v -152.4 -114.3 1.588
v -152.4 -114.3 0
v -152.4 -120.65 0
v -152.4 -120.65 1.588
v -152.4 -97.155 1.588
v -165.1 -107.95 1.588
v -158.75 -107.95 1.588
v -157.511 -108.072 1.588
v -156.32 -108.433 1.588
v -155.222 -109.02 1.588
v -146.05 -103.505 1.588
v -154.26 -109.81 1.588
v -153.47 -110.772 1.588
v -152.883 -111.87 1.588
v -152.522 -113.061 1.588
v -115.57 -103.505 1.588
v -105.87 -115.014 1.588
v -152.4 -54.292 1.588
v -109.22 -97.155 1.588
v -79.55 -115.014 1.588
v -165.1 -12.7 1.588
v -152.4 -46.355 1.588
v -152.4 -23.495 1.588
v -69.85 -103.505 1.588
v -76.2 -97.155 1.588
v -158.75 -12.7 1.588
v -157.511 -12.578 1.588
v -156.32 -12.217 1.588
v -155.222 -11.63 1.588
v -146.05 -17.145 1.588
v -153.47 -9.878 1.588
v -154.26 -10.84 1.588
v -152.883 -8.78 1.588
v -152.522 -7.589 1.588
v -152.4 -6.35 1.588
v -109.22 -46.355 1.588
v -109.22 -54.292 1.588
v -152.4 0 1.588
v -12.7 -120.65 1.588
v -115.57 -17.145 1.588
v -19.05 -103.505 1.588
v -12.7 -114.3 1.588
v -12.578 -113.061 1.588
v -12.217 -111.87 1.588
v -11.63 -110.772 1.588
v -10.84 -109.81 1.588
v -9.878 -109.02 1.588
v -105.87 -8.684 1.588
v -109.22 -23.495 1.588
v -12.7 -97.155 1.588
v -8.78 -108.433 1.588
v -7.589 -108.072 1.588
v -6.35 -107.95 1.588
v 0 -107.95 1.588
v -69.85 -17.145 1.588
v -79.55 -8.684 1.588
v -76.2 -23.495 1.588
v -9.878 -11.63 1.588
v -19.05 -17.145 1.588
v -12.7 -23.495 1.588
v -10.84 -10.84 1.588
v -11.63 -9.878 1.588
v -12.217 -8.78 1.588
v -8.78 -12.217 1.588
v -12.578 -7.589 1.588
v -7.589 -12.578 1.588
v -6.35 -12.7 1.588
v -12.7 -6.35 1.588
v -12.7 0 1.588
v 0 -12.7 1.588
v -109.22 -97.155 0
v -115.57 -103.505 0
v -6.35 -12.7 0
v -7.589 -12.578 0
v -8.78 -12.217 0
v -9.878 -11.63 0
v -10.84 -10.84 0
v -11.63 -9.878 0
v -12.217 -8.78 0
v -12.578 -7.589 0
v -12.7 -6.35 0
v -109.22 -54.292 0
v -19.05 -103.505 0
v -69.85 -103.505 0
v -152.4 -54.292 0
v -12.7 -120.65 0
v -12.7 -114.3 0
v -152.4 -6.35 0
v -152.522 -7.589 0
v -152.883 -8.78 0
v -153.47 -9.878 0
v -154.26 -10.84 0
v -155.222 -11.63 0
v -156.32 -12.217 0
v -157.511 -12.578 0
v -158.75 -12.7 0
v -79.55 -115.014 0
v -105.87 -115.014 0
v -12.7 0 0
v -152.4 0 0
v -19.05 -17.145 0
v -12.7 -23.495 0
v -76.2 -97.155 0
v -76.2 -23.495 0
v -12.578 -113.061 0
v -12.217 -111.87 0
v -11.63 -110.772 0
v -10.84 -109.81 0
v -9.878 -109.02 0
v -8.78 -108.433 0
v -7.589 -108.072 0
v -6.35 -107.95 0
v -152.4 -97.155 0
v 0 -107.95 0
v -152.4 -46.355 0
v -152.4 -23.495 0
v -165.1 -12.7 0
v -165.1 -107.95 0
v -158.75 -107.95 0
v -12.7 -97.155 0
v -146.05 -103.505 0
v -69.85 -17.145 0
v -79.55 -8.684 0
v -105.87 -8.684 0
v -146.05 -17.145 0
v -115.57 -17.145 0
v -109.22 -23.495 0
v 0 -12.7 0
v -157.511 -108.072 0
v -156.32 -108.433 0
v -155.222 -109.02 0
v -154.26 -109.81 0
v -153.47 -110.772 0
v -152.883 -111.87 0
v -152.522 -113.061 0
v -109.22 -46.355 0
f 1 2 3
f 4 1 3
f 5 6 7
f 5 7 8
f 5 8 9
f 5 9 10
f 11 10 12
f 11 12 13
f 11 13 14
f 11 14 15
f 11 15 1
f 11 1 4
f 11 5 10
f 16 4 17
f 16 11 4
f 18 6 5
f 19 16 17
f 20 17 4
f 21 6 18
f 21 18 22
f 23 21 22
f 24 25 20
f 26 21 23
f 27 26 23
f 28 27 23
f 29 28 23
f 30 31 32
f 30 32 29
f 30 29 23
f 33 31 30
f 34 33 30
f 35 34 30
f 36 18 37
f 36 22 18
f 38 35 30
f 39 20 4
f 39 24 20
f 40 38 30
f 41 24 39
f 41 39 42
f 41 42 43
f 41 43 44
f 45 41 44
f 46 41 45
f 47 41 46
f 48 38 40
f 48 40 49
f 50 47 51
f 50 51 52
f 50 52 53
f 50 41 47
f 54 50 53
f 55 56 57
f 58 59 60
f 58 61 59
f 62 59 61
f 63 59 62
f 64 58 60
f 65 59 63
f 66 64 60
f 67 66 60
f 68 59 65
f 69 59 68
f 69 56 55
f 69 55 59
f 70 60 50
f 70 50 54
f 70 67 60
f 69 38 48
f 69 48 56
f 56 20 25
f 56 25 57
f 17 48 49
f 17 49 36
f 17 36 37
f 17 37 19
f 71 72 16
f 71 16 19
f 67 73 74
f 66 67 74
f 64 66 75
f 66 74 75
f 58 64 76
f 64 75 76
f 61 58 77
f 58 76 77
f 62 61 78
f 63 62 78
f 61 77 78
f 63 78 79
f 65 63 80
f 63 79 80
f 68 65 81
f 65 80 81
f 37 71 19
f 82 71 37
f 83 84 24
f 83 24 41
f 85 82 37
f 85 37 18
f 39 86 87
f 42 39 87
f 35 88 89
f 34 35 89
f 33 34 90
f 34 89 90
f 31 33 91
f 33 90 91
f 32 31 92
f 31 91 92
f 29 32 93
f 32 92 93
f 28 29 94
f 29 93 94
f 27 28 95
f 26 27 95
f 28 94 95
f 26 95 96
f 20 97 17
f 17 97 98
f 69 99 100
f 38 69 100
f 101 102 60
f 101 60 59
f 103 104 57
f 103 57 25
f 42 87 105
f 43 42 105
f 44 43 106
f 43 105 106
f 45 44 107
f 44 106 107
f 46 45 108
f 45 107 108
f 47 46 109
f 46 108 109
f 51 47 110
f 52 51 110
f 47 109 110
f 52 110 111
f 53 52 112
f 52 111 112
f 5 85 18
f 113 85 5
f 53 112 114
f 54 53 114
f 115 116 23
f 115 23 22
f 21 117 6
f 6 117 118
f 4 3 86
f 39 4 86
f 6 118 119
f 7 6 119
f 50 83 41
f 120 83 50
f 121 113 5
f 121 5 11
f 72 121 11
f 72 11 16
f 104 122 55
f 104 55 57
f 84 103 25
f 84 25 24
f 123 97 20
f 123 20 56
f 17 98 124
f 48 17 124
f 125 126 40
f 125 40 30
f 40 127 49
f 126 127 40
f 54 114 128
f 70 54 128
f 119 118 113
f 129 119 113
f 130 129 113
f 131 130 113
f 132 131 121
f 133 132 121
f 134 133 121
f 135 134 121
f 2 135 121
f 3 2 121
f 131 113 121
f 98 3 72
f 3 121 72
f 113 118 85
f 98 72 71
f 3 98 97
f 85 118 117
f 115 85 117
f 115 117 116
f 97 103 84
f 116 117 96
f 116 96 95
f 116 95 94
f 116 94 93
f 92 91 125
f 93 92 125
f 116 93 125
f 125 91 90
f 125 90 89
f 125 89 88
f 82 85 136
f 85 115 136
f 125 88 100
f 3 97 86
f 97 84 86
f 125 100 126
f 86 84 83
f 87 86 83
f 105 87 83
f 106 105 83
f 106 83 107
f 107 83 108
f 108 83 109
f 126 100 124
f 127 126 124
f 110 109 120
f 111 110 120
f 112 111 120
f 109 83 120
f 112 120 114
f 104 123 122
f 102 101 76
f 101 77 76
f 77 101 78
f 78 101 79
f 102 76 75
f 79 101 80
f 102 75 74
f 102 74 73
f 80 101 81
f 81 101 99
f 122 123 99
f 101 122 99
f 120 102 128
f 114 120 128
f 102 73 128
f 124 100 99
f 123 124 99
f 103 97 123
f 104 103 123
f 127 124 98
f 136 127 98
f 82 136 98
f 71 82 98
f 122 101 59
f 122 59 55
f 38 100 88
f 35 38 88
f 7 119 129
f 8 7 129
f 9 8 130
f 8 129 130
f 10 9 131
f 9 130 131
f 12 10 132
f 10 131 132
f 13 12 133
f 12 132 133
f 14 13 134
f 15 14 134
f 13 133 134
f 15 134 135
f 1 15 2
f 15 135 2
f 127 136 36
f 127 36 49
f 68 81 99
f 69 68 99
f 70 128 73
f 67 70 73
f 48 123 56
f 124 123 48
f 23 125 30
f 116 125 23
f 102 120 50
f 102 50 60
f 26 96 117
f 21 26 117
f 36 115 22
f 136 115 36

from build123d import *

# Parameters (mm, degrees)
SKETCH1_W           = 20.32
SKETCH1_H           = 100.33
BOSS_EXTRUDE1_DEPTH = 1.5875
SKETCH2_W           = 26.32
SKETCH2_H           = 106.33
CUT_EXTRUDE1_DEPTH  = 2.5875


with BuildPart() as part:
    # Sketch1 → Boss-Extrude1 (new body)
    with BuildSketch(Plane.XY):
        with BuildLine():
            Line((0, -12.7), (-6.35, -12.7))
            ThreePointArc((-6.35, -12.7), (-10.840128061, -10.840128061), (-12.7, -6.35))
            Line((-12.7, -6.35), (-12.7, 0))
            Line((-12.7, 0), (-152.4, 0))
            Line((-152.4, 0), (-152.4, -6.35))
            ThreePointArc((-152.4, -6.35), (-154.259871939, -10.840128061), (-158.75, -12.7))
            Line((-158.75, -12.7), (-165.1, -12.7))
            Line((-165.1, -12.7), (-165.1, -107.95))
            Line((-165.1, -107.95), (-158.75, -107.95))
            ThreePointArc((-158.75, -107.95), (-154.259871939, -109.809871939), (-152.4, -114.3))
            Line((-152.4, -114.3), (-152.4, -120.65))
            Line((-152.4, -120.65), (-12.7, -120.65))
            Line((-12.7, -120.65), (-12.7, -114.3))
            ThreePointArc((-12.7, -114.3), (-10.840128061, -109.809871939), (-6.35, -107.95))
            Line((-6.35, -107.95), (0, -107.95))
            Line((0, -107.95), (0, -12.7))
        make_face()
        with Locations((-92.71, -61.849)):
            Rectangle(SKETCH1_W, SKETCH1_H, mode=Mode.SUBTRACT)
        Polygon((-19.05, -17.145), (-69.85, -17.145), (-76.2, -23.495), (-76.2, -97.155), (-69.85, -103.505), (-19.05, -103.505), (-12.7, -97.155), (-12.7, -23.495), align=None, mode=Mode.SUBTRACT)
        Polygon((-152.4, -23.495), (-152.4, -46.355), (-109.22, -46.355), (-109.22, -23.495), (-115.57, -17.145), (-146.05, -17.145), align=None, mode=Mode.SUBTRACT)
        Polygon((-109.22, -97.155), (-109.22, -54.2925), (-152.4, -54.2925), (-152.4, -97.155), (-146.05, -103.505), (-115.57, -103.505), align=None, mode=Mode.SUBTRACT)
    extrude(amount=BOSS_EXTRUDE1_DEPTH)

    # Sketch2 → Cut-Extrude1 (cut, through all)
    with BuildSketch(Plane(origin=(0, 0, 0), x_dir=(-1, 0, 0), z_dir=(0, 0, -1))):
        with Locations((92.71, -61.849)):
            Rectangle(SKETCH2_W, SKETCH2_H)
    extrude(amount=-CUT_EXTRUDE1_DEPTH, mode=Mode.SUBTRACT)


solid = part.part
